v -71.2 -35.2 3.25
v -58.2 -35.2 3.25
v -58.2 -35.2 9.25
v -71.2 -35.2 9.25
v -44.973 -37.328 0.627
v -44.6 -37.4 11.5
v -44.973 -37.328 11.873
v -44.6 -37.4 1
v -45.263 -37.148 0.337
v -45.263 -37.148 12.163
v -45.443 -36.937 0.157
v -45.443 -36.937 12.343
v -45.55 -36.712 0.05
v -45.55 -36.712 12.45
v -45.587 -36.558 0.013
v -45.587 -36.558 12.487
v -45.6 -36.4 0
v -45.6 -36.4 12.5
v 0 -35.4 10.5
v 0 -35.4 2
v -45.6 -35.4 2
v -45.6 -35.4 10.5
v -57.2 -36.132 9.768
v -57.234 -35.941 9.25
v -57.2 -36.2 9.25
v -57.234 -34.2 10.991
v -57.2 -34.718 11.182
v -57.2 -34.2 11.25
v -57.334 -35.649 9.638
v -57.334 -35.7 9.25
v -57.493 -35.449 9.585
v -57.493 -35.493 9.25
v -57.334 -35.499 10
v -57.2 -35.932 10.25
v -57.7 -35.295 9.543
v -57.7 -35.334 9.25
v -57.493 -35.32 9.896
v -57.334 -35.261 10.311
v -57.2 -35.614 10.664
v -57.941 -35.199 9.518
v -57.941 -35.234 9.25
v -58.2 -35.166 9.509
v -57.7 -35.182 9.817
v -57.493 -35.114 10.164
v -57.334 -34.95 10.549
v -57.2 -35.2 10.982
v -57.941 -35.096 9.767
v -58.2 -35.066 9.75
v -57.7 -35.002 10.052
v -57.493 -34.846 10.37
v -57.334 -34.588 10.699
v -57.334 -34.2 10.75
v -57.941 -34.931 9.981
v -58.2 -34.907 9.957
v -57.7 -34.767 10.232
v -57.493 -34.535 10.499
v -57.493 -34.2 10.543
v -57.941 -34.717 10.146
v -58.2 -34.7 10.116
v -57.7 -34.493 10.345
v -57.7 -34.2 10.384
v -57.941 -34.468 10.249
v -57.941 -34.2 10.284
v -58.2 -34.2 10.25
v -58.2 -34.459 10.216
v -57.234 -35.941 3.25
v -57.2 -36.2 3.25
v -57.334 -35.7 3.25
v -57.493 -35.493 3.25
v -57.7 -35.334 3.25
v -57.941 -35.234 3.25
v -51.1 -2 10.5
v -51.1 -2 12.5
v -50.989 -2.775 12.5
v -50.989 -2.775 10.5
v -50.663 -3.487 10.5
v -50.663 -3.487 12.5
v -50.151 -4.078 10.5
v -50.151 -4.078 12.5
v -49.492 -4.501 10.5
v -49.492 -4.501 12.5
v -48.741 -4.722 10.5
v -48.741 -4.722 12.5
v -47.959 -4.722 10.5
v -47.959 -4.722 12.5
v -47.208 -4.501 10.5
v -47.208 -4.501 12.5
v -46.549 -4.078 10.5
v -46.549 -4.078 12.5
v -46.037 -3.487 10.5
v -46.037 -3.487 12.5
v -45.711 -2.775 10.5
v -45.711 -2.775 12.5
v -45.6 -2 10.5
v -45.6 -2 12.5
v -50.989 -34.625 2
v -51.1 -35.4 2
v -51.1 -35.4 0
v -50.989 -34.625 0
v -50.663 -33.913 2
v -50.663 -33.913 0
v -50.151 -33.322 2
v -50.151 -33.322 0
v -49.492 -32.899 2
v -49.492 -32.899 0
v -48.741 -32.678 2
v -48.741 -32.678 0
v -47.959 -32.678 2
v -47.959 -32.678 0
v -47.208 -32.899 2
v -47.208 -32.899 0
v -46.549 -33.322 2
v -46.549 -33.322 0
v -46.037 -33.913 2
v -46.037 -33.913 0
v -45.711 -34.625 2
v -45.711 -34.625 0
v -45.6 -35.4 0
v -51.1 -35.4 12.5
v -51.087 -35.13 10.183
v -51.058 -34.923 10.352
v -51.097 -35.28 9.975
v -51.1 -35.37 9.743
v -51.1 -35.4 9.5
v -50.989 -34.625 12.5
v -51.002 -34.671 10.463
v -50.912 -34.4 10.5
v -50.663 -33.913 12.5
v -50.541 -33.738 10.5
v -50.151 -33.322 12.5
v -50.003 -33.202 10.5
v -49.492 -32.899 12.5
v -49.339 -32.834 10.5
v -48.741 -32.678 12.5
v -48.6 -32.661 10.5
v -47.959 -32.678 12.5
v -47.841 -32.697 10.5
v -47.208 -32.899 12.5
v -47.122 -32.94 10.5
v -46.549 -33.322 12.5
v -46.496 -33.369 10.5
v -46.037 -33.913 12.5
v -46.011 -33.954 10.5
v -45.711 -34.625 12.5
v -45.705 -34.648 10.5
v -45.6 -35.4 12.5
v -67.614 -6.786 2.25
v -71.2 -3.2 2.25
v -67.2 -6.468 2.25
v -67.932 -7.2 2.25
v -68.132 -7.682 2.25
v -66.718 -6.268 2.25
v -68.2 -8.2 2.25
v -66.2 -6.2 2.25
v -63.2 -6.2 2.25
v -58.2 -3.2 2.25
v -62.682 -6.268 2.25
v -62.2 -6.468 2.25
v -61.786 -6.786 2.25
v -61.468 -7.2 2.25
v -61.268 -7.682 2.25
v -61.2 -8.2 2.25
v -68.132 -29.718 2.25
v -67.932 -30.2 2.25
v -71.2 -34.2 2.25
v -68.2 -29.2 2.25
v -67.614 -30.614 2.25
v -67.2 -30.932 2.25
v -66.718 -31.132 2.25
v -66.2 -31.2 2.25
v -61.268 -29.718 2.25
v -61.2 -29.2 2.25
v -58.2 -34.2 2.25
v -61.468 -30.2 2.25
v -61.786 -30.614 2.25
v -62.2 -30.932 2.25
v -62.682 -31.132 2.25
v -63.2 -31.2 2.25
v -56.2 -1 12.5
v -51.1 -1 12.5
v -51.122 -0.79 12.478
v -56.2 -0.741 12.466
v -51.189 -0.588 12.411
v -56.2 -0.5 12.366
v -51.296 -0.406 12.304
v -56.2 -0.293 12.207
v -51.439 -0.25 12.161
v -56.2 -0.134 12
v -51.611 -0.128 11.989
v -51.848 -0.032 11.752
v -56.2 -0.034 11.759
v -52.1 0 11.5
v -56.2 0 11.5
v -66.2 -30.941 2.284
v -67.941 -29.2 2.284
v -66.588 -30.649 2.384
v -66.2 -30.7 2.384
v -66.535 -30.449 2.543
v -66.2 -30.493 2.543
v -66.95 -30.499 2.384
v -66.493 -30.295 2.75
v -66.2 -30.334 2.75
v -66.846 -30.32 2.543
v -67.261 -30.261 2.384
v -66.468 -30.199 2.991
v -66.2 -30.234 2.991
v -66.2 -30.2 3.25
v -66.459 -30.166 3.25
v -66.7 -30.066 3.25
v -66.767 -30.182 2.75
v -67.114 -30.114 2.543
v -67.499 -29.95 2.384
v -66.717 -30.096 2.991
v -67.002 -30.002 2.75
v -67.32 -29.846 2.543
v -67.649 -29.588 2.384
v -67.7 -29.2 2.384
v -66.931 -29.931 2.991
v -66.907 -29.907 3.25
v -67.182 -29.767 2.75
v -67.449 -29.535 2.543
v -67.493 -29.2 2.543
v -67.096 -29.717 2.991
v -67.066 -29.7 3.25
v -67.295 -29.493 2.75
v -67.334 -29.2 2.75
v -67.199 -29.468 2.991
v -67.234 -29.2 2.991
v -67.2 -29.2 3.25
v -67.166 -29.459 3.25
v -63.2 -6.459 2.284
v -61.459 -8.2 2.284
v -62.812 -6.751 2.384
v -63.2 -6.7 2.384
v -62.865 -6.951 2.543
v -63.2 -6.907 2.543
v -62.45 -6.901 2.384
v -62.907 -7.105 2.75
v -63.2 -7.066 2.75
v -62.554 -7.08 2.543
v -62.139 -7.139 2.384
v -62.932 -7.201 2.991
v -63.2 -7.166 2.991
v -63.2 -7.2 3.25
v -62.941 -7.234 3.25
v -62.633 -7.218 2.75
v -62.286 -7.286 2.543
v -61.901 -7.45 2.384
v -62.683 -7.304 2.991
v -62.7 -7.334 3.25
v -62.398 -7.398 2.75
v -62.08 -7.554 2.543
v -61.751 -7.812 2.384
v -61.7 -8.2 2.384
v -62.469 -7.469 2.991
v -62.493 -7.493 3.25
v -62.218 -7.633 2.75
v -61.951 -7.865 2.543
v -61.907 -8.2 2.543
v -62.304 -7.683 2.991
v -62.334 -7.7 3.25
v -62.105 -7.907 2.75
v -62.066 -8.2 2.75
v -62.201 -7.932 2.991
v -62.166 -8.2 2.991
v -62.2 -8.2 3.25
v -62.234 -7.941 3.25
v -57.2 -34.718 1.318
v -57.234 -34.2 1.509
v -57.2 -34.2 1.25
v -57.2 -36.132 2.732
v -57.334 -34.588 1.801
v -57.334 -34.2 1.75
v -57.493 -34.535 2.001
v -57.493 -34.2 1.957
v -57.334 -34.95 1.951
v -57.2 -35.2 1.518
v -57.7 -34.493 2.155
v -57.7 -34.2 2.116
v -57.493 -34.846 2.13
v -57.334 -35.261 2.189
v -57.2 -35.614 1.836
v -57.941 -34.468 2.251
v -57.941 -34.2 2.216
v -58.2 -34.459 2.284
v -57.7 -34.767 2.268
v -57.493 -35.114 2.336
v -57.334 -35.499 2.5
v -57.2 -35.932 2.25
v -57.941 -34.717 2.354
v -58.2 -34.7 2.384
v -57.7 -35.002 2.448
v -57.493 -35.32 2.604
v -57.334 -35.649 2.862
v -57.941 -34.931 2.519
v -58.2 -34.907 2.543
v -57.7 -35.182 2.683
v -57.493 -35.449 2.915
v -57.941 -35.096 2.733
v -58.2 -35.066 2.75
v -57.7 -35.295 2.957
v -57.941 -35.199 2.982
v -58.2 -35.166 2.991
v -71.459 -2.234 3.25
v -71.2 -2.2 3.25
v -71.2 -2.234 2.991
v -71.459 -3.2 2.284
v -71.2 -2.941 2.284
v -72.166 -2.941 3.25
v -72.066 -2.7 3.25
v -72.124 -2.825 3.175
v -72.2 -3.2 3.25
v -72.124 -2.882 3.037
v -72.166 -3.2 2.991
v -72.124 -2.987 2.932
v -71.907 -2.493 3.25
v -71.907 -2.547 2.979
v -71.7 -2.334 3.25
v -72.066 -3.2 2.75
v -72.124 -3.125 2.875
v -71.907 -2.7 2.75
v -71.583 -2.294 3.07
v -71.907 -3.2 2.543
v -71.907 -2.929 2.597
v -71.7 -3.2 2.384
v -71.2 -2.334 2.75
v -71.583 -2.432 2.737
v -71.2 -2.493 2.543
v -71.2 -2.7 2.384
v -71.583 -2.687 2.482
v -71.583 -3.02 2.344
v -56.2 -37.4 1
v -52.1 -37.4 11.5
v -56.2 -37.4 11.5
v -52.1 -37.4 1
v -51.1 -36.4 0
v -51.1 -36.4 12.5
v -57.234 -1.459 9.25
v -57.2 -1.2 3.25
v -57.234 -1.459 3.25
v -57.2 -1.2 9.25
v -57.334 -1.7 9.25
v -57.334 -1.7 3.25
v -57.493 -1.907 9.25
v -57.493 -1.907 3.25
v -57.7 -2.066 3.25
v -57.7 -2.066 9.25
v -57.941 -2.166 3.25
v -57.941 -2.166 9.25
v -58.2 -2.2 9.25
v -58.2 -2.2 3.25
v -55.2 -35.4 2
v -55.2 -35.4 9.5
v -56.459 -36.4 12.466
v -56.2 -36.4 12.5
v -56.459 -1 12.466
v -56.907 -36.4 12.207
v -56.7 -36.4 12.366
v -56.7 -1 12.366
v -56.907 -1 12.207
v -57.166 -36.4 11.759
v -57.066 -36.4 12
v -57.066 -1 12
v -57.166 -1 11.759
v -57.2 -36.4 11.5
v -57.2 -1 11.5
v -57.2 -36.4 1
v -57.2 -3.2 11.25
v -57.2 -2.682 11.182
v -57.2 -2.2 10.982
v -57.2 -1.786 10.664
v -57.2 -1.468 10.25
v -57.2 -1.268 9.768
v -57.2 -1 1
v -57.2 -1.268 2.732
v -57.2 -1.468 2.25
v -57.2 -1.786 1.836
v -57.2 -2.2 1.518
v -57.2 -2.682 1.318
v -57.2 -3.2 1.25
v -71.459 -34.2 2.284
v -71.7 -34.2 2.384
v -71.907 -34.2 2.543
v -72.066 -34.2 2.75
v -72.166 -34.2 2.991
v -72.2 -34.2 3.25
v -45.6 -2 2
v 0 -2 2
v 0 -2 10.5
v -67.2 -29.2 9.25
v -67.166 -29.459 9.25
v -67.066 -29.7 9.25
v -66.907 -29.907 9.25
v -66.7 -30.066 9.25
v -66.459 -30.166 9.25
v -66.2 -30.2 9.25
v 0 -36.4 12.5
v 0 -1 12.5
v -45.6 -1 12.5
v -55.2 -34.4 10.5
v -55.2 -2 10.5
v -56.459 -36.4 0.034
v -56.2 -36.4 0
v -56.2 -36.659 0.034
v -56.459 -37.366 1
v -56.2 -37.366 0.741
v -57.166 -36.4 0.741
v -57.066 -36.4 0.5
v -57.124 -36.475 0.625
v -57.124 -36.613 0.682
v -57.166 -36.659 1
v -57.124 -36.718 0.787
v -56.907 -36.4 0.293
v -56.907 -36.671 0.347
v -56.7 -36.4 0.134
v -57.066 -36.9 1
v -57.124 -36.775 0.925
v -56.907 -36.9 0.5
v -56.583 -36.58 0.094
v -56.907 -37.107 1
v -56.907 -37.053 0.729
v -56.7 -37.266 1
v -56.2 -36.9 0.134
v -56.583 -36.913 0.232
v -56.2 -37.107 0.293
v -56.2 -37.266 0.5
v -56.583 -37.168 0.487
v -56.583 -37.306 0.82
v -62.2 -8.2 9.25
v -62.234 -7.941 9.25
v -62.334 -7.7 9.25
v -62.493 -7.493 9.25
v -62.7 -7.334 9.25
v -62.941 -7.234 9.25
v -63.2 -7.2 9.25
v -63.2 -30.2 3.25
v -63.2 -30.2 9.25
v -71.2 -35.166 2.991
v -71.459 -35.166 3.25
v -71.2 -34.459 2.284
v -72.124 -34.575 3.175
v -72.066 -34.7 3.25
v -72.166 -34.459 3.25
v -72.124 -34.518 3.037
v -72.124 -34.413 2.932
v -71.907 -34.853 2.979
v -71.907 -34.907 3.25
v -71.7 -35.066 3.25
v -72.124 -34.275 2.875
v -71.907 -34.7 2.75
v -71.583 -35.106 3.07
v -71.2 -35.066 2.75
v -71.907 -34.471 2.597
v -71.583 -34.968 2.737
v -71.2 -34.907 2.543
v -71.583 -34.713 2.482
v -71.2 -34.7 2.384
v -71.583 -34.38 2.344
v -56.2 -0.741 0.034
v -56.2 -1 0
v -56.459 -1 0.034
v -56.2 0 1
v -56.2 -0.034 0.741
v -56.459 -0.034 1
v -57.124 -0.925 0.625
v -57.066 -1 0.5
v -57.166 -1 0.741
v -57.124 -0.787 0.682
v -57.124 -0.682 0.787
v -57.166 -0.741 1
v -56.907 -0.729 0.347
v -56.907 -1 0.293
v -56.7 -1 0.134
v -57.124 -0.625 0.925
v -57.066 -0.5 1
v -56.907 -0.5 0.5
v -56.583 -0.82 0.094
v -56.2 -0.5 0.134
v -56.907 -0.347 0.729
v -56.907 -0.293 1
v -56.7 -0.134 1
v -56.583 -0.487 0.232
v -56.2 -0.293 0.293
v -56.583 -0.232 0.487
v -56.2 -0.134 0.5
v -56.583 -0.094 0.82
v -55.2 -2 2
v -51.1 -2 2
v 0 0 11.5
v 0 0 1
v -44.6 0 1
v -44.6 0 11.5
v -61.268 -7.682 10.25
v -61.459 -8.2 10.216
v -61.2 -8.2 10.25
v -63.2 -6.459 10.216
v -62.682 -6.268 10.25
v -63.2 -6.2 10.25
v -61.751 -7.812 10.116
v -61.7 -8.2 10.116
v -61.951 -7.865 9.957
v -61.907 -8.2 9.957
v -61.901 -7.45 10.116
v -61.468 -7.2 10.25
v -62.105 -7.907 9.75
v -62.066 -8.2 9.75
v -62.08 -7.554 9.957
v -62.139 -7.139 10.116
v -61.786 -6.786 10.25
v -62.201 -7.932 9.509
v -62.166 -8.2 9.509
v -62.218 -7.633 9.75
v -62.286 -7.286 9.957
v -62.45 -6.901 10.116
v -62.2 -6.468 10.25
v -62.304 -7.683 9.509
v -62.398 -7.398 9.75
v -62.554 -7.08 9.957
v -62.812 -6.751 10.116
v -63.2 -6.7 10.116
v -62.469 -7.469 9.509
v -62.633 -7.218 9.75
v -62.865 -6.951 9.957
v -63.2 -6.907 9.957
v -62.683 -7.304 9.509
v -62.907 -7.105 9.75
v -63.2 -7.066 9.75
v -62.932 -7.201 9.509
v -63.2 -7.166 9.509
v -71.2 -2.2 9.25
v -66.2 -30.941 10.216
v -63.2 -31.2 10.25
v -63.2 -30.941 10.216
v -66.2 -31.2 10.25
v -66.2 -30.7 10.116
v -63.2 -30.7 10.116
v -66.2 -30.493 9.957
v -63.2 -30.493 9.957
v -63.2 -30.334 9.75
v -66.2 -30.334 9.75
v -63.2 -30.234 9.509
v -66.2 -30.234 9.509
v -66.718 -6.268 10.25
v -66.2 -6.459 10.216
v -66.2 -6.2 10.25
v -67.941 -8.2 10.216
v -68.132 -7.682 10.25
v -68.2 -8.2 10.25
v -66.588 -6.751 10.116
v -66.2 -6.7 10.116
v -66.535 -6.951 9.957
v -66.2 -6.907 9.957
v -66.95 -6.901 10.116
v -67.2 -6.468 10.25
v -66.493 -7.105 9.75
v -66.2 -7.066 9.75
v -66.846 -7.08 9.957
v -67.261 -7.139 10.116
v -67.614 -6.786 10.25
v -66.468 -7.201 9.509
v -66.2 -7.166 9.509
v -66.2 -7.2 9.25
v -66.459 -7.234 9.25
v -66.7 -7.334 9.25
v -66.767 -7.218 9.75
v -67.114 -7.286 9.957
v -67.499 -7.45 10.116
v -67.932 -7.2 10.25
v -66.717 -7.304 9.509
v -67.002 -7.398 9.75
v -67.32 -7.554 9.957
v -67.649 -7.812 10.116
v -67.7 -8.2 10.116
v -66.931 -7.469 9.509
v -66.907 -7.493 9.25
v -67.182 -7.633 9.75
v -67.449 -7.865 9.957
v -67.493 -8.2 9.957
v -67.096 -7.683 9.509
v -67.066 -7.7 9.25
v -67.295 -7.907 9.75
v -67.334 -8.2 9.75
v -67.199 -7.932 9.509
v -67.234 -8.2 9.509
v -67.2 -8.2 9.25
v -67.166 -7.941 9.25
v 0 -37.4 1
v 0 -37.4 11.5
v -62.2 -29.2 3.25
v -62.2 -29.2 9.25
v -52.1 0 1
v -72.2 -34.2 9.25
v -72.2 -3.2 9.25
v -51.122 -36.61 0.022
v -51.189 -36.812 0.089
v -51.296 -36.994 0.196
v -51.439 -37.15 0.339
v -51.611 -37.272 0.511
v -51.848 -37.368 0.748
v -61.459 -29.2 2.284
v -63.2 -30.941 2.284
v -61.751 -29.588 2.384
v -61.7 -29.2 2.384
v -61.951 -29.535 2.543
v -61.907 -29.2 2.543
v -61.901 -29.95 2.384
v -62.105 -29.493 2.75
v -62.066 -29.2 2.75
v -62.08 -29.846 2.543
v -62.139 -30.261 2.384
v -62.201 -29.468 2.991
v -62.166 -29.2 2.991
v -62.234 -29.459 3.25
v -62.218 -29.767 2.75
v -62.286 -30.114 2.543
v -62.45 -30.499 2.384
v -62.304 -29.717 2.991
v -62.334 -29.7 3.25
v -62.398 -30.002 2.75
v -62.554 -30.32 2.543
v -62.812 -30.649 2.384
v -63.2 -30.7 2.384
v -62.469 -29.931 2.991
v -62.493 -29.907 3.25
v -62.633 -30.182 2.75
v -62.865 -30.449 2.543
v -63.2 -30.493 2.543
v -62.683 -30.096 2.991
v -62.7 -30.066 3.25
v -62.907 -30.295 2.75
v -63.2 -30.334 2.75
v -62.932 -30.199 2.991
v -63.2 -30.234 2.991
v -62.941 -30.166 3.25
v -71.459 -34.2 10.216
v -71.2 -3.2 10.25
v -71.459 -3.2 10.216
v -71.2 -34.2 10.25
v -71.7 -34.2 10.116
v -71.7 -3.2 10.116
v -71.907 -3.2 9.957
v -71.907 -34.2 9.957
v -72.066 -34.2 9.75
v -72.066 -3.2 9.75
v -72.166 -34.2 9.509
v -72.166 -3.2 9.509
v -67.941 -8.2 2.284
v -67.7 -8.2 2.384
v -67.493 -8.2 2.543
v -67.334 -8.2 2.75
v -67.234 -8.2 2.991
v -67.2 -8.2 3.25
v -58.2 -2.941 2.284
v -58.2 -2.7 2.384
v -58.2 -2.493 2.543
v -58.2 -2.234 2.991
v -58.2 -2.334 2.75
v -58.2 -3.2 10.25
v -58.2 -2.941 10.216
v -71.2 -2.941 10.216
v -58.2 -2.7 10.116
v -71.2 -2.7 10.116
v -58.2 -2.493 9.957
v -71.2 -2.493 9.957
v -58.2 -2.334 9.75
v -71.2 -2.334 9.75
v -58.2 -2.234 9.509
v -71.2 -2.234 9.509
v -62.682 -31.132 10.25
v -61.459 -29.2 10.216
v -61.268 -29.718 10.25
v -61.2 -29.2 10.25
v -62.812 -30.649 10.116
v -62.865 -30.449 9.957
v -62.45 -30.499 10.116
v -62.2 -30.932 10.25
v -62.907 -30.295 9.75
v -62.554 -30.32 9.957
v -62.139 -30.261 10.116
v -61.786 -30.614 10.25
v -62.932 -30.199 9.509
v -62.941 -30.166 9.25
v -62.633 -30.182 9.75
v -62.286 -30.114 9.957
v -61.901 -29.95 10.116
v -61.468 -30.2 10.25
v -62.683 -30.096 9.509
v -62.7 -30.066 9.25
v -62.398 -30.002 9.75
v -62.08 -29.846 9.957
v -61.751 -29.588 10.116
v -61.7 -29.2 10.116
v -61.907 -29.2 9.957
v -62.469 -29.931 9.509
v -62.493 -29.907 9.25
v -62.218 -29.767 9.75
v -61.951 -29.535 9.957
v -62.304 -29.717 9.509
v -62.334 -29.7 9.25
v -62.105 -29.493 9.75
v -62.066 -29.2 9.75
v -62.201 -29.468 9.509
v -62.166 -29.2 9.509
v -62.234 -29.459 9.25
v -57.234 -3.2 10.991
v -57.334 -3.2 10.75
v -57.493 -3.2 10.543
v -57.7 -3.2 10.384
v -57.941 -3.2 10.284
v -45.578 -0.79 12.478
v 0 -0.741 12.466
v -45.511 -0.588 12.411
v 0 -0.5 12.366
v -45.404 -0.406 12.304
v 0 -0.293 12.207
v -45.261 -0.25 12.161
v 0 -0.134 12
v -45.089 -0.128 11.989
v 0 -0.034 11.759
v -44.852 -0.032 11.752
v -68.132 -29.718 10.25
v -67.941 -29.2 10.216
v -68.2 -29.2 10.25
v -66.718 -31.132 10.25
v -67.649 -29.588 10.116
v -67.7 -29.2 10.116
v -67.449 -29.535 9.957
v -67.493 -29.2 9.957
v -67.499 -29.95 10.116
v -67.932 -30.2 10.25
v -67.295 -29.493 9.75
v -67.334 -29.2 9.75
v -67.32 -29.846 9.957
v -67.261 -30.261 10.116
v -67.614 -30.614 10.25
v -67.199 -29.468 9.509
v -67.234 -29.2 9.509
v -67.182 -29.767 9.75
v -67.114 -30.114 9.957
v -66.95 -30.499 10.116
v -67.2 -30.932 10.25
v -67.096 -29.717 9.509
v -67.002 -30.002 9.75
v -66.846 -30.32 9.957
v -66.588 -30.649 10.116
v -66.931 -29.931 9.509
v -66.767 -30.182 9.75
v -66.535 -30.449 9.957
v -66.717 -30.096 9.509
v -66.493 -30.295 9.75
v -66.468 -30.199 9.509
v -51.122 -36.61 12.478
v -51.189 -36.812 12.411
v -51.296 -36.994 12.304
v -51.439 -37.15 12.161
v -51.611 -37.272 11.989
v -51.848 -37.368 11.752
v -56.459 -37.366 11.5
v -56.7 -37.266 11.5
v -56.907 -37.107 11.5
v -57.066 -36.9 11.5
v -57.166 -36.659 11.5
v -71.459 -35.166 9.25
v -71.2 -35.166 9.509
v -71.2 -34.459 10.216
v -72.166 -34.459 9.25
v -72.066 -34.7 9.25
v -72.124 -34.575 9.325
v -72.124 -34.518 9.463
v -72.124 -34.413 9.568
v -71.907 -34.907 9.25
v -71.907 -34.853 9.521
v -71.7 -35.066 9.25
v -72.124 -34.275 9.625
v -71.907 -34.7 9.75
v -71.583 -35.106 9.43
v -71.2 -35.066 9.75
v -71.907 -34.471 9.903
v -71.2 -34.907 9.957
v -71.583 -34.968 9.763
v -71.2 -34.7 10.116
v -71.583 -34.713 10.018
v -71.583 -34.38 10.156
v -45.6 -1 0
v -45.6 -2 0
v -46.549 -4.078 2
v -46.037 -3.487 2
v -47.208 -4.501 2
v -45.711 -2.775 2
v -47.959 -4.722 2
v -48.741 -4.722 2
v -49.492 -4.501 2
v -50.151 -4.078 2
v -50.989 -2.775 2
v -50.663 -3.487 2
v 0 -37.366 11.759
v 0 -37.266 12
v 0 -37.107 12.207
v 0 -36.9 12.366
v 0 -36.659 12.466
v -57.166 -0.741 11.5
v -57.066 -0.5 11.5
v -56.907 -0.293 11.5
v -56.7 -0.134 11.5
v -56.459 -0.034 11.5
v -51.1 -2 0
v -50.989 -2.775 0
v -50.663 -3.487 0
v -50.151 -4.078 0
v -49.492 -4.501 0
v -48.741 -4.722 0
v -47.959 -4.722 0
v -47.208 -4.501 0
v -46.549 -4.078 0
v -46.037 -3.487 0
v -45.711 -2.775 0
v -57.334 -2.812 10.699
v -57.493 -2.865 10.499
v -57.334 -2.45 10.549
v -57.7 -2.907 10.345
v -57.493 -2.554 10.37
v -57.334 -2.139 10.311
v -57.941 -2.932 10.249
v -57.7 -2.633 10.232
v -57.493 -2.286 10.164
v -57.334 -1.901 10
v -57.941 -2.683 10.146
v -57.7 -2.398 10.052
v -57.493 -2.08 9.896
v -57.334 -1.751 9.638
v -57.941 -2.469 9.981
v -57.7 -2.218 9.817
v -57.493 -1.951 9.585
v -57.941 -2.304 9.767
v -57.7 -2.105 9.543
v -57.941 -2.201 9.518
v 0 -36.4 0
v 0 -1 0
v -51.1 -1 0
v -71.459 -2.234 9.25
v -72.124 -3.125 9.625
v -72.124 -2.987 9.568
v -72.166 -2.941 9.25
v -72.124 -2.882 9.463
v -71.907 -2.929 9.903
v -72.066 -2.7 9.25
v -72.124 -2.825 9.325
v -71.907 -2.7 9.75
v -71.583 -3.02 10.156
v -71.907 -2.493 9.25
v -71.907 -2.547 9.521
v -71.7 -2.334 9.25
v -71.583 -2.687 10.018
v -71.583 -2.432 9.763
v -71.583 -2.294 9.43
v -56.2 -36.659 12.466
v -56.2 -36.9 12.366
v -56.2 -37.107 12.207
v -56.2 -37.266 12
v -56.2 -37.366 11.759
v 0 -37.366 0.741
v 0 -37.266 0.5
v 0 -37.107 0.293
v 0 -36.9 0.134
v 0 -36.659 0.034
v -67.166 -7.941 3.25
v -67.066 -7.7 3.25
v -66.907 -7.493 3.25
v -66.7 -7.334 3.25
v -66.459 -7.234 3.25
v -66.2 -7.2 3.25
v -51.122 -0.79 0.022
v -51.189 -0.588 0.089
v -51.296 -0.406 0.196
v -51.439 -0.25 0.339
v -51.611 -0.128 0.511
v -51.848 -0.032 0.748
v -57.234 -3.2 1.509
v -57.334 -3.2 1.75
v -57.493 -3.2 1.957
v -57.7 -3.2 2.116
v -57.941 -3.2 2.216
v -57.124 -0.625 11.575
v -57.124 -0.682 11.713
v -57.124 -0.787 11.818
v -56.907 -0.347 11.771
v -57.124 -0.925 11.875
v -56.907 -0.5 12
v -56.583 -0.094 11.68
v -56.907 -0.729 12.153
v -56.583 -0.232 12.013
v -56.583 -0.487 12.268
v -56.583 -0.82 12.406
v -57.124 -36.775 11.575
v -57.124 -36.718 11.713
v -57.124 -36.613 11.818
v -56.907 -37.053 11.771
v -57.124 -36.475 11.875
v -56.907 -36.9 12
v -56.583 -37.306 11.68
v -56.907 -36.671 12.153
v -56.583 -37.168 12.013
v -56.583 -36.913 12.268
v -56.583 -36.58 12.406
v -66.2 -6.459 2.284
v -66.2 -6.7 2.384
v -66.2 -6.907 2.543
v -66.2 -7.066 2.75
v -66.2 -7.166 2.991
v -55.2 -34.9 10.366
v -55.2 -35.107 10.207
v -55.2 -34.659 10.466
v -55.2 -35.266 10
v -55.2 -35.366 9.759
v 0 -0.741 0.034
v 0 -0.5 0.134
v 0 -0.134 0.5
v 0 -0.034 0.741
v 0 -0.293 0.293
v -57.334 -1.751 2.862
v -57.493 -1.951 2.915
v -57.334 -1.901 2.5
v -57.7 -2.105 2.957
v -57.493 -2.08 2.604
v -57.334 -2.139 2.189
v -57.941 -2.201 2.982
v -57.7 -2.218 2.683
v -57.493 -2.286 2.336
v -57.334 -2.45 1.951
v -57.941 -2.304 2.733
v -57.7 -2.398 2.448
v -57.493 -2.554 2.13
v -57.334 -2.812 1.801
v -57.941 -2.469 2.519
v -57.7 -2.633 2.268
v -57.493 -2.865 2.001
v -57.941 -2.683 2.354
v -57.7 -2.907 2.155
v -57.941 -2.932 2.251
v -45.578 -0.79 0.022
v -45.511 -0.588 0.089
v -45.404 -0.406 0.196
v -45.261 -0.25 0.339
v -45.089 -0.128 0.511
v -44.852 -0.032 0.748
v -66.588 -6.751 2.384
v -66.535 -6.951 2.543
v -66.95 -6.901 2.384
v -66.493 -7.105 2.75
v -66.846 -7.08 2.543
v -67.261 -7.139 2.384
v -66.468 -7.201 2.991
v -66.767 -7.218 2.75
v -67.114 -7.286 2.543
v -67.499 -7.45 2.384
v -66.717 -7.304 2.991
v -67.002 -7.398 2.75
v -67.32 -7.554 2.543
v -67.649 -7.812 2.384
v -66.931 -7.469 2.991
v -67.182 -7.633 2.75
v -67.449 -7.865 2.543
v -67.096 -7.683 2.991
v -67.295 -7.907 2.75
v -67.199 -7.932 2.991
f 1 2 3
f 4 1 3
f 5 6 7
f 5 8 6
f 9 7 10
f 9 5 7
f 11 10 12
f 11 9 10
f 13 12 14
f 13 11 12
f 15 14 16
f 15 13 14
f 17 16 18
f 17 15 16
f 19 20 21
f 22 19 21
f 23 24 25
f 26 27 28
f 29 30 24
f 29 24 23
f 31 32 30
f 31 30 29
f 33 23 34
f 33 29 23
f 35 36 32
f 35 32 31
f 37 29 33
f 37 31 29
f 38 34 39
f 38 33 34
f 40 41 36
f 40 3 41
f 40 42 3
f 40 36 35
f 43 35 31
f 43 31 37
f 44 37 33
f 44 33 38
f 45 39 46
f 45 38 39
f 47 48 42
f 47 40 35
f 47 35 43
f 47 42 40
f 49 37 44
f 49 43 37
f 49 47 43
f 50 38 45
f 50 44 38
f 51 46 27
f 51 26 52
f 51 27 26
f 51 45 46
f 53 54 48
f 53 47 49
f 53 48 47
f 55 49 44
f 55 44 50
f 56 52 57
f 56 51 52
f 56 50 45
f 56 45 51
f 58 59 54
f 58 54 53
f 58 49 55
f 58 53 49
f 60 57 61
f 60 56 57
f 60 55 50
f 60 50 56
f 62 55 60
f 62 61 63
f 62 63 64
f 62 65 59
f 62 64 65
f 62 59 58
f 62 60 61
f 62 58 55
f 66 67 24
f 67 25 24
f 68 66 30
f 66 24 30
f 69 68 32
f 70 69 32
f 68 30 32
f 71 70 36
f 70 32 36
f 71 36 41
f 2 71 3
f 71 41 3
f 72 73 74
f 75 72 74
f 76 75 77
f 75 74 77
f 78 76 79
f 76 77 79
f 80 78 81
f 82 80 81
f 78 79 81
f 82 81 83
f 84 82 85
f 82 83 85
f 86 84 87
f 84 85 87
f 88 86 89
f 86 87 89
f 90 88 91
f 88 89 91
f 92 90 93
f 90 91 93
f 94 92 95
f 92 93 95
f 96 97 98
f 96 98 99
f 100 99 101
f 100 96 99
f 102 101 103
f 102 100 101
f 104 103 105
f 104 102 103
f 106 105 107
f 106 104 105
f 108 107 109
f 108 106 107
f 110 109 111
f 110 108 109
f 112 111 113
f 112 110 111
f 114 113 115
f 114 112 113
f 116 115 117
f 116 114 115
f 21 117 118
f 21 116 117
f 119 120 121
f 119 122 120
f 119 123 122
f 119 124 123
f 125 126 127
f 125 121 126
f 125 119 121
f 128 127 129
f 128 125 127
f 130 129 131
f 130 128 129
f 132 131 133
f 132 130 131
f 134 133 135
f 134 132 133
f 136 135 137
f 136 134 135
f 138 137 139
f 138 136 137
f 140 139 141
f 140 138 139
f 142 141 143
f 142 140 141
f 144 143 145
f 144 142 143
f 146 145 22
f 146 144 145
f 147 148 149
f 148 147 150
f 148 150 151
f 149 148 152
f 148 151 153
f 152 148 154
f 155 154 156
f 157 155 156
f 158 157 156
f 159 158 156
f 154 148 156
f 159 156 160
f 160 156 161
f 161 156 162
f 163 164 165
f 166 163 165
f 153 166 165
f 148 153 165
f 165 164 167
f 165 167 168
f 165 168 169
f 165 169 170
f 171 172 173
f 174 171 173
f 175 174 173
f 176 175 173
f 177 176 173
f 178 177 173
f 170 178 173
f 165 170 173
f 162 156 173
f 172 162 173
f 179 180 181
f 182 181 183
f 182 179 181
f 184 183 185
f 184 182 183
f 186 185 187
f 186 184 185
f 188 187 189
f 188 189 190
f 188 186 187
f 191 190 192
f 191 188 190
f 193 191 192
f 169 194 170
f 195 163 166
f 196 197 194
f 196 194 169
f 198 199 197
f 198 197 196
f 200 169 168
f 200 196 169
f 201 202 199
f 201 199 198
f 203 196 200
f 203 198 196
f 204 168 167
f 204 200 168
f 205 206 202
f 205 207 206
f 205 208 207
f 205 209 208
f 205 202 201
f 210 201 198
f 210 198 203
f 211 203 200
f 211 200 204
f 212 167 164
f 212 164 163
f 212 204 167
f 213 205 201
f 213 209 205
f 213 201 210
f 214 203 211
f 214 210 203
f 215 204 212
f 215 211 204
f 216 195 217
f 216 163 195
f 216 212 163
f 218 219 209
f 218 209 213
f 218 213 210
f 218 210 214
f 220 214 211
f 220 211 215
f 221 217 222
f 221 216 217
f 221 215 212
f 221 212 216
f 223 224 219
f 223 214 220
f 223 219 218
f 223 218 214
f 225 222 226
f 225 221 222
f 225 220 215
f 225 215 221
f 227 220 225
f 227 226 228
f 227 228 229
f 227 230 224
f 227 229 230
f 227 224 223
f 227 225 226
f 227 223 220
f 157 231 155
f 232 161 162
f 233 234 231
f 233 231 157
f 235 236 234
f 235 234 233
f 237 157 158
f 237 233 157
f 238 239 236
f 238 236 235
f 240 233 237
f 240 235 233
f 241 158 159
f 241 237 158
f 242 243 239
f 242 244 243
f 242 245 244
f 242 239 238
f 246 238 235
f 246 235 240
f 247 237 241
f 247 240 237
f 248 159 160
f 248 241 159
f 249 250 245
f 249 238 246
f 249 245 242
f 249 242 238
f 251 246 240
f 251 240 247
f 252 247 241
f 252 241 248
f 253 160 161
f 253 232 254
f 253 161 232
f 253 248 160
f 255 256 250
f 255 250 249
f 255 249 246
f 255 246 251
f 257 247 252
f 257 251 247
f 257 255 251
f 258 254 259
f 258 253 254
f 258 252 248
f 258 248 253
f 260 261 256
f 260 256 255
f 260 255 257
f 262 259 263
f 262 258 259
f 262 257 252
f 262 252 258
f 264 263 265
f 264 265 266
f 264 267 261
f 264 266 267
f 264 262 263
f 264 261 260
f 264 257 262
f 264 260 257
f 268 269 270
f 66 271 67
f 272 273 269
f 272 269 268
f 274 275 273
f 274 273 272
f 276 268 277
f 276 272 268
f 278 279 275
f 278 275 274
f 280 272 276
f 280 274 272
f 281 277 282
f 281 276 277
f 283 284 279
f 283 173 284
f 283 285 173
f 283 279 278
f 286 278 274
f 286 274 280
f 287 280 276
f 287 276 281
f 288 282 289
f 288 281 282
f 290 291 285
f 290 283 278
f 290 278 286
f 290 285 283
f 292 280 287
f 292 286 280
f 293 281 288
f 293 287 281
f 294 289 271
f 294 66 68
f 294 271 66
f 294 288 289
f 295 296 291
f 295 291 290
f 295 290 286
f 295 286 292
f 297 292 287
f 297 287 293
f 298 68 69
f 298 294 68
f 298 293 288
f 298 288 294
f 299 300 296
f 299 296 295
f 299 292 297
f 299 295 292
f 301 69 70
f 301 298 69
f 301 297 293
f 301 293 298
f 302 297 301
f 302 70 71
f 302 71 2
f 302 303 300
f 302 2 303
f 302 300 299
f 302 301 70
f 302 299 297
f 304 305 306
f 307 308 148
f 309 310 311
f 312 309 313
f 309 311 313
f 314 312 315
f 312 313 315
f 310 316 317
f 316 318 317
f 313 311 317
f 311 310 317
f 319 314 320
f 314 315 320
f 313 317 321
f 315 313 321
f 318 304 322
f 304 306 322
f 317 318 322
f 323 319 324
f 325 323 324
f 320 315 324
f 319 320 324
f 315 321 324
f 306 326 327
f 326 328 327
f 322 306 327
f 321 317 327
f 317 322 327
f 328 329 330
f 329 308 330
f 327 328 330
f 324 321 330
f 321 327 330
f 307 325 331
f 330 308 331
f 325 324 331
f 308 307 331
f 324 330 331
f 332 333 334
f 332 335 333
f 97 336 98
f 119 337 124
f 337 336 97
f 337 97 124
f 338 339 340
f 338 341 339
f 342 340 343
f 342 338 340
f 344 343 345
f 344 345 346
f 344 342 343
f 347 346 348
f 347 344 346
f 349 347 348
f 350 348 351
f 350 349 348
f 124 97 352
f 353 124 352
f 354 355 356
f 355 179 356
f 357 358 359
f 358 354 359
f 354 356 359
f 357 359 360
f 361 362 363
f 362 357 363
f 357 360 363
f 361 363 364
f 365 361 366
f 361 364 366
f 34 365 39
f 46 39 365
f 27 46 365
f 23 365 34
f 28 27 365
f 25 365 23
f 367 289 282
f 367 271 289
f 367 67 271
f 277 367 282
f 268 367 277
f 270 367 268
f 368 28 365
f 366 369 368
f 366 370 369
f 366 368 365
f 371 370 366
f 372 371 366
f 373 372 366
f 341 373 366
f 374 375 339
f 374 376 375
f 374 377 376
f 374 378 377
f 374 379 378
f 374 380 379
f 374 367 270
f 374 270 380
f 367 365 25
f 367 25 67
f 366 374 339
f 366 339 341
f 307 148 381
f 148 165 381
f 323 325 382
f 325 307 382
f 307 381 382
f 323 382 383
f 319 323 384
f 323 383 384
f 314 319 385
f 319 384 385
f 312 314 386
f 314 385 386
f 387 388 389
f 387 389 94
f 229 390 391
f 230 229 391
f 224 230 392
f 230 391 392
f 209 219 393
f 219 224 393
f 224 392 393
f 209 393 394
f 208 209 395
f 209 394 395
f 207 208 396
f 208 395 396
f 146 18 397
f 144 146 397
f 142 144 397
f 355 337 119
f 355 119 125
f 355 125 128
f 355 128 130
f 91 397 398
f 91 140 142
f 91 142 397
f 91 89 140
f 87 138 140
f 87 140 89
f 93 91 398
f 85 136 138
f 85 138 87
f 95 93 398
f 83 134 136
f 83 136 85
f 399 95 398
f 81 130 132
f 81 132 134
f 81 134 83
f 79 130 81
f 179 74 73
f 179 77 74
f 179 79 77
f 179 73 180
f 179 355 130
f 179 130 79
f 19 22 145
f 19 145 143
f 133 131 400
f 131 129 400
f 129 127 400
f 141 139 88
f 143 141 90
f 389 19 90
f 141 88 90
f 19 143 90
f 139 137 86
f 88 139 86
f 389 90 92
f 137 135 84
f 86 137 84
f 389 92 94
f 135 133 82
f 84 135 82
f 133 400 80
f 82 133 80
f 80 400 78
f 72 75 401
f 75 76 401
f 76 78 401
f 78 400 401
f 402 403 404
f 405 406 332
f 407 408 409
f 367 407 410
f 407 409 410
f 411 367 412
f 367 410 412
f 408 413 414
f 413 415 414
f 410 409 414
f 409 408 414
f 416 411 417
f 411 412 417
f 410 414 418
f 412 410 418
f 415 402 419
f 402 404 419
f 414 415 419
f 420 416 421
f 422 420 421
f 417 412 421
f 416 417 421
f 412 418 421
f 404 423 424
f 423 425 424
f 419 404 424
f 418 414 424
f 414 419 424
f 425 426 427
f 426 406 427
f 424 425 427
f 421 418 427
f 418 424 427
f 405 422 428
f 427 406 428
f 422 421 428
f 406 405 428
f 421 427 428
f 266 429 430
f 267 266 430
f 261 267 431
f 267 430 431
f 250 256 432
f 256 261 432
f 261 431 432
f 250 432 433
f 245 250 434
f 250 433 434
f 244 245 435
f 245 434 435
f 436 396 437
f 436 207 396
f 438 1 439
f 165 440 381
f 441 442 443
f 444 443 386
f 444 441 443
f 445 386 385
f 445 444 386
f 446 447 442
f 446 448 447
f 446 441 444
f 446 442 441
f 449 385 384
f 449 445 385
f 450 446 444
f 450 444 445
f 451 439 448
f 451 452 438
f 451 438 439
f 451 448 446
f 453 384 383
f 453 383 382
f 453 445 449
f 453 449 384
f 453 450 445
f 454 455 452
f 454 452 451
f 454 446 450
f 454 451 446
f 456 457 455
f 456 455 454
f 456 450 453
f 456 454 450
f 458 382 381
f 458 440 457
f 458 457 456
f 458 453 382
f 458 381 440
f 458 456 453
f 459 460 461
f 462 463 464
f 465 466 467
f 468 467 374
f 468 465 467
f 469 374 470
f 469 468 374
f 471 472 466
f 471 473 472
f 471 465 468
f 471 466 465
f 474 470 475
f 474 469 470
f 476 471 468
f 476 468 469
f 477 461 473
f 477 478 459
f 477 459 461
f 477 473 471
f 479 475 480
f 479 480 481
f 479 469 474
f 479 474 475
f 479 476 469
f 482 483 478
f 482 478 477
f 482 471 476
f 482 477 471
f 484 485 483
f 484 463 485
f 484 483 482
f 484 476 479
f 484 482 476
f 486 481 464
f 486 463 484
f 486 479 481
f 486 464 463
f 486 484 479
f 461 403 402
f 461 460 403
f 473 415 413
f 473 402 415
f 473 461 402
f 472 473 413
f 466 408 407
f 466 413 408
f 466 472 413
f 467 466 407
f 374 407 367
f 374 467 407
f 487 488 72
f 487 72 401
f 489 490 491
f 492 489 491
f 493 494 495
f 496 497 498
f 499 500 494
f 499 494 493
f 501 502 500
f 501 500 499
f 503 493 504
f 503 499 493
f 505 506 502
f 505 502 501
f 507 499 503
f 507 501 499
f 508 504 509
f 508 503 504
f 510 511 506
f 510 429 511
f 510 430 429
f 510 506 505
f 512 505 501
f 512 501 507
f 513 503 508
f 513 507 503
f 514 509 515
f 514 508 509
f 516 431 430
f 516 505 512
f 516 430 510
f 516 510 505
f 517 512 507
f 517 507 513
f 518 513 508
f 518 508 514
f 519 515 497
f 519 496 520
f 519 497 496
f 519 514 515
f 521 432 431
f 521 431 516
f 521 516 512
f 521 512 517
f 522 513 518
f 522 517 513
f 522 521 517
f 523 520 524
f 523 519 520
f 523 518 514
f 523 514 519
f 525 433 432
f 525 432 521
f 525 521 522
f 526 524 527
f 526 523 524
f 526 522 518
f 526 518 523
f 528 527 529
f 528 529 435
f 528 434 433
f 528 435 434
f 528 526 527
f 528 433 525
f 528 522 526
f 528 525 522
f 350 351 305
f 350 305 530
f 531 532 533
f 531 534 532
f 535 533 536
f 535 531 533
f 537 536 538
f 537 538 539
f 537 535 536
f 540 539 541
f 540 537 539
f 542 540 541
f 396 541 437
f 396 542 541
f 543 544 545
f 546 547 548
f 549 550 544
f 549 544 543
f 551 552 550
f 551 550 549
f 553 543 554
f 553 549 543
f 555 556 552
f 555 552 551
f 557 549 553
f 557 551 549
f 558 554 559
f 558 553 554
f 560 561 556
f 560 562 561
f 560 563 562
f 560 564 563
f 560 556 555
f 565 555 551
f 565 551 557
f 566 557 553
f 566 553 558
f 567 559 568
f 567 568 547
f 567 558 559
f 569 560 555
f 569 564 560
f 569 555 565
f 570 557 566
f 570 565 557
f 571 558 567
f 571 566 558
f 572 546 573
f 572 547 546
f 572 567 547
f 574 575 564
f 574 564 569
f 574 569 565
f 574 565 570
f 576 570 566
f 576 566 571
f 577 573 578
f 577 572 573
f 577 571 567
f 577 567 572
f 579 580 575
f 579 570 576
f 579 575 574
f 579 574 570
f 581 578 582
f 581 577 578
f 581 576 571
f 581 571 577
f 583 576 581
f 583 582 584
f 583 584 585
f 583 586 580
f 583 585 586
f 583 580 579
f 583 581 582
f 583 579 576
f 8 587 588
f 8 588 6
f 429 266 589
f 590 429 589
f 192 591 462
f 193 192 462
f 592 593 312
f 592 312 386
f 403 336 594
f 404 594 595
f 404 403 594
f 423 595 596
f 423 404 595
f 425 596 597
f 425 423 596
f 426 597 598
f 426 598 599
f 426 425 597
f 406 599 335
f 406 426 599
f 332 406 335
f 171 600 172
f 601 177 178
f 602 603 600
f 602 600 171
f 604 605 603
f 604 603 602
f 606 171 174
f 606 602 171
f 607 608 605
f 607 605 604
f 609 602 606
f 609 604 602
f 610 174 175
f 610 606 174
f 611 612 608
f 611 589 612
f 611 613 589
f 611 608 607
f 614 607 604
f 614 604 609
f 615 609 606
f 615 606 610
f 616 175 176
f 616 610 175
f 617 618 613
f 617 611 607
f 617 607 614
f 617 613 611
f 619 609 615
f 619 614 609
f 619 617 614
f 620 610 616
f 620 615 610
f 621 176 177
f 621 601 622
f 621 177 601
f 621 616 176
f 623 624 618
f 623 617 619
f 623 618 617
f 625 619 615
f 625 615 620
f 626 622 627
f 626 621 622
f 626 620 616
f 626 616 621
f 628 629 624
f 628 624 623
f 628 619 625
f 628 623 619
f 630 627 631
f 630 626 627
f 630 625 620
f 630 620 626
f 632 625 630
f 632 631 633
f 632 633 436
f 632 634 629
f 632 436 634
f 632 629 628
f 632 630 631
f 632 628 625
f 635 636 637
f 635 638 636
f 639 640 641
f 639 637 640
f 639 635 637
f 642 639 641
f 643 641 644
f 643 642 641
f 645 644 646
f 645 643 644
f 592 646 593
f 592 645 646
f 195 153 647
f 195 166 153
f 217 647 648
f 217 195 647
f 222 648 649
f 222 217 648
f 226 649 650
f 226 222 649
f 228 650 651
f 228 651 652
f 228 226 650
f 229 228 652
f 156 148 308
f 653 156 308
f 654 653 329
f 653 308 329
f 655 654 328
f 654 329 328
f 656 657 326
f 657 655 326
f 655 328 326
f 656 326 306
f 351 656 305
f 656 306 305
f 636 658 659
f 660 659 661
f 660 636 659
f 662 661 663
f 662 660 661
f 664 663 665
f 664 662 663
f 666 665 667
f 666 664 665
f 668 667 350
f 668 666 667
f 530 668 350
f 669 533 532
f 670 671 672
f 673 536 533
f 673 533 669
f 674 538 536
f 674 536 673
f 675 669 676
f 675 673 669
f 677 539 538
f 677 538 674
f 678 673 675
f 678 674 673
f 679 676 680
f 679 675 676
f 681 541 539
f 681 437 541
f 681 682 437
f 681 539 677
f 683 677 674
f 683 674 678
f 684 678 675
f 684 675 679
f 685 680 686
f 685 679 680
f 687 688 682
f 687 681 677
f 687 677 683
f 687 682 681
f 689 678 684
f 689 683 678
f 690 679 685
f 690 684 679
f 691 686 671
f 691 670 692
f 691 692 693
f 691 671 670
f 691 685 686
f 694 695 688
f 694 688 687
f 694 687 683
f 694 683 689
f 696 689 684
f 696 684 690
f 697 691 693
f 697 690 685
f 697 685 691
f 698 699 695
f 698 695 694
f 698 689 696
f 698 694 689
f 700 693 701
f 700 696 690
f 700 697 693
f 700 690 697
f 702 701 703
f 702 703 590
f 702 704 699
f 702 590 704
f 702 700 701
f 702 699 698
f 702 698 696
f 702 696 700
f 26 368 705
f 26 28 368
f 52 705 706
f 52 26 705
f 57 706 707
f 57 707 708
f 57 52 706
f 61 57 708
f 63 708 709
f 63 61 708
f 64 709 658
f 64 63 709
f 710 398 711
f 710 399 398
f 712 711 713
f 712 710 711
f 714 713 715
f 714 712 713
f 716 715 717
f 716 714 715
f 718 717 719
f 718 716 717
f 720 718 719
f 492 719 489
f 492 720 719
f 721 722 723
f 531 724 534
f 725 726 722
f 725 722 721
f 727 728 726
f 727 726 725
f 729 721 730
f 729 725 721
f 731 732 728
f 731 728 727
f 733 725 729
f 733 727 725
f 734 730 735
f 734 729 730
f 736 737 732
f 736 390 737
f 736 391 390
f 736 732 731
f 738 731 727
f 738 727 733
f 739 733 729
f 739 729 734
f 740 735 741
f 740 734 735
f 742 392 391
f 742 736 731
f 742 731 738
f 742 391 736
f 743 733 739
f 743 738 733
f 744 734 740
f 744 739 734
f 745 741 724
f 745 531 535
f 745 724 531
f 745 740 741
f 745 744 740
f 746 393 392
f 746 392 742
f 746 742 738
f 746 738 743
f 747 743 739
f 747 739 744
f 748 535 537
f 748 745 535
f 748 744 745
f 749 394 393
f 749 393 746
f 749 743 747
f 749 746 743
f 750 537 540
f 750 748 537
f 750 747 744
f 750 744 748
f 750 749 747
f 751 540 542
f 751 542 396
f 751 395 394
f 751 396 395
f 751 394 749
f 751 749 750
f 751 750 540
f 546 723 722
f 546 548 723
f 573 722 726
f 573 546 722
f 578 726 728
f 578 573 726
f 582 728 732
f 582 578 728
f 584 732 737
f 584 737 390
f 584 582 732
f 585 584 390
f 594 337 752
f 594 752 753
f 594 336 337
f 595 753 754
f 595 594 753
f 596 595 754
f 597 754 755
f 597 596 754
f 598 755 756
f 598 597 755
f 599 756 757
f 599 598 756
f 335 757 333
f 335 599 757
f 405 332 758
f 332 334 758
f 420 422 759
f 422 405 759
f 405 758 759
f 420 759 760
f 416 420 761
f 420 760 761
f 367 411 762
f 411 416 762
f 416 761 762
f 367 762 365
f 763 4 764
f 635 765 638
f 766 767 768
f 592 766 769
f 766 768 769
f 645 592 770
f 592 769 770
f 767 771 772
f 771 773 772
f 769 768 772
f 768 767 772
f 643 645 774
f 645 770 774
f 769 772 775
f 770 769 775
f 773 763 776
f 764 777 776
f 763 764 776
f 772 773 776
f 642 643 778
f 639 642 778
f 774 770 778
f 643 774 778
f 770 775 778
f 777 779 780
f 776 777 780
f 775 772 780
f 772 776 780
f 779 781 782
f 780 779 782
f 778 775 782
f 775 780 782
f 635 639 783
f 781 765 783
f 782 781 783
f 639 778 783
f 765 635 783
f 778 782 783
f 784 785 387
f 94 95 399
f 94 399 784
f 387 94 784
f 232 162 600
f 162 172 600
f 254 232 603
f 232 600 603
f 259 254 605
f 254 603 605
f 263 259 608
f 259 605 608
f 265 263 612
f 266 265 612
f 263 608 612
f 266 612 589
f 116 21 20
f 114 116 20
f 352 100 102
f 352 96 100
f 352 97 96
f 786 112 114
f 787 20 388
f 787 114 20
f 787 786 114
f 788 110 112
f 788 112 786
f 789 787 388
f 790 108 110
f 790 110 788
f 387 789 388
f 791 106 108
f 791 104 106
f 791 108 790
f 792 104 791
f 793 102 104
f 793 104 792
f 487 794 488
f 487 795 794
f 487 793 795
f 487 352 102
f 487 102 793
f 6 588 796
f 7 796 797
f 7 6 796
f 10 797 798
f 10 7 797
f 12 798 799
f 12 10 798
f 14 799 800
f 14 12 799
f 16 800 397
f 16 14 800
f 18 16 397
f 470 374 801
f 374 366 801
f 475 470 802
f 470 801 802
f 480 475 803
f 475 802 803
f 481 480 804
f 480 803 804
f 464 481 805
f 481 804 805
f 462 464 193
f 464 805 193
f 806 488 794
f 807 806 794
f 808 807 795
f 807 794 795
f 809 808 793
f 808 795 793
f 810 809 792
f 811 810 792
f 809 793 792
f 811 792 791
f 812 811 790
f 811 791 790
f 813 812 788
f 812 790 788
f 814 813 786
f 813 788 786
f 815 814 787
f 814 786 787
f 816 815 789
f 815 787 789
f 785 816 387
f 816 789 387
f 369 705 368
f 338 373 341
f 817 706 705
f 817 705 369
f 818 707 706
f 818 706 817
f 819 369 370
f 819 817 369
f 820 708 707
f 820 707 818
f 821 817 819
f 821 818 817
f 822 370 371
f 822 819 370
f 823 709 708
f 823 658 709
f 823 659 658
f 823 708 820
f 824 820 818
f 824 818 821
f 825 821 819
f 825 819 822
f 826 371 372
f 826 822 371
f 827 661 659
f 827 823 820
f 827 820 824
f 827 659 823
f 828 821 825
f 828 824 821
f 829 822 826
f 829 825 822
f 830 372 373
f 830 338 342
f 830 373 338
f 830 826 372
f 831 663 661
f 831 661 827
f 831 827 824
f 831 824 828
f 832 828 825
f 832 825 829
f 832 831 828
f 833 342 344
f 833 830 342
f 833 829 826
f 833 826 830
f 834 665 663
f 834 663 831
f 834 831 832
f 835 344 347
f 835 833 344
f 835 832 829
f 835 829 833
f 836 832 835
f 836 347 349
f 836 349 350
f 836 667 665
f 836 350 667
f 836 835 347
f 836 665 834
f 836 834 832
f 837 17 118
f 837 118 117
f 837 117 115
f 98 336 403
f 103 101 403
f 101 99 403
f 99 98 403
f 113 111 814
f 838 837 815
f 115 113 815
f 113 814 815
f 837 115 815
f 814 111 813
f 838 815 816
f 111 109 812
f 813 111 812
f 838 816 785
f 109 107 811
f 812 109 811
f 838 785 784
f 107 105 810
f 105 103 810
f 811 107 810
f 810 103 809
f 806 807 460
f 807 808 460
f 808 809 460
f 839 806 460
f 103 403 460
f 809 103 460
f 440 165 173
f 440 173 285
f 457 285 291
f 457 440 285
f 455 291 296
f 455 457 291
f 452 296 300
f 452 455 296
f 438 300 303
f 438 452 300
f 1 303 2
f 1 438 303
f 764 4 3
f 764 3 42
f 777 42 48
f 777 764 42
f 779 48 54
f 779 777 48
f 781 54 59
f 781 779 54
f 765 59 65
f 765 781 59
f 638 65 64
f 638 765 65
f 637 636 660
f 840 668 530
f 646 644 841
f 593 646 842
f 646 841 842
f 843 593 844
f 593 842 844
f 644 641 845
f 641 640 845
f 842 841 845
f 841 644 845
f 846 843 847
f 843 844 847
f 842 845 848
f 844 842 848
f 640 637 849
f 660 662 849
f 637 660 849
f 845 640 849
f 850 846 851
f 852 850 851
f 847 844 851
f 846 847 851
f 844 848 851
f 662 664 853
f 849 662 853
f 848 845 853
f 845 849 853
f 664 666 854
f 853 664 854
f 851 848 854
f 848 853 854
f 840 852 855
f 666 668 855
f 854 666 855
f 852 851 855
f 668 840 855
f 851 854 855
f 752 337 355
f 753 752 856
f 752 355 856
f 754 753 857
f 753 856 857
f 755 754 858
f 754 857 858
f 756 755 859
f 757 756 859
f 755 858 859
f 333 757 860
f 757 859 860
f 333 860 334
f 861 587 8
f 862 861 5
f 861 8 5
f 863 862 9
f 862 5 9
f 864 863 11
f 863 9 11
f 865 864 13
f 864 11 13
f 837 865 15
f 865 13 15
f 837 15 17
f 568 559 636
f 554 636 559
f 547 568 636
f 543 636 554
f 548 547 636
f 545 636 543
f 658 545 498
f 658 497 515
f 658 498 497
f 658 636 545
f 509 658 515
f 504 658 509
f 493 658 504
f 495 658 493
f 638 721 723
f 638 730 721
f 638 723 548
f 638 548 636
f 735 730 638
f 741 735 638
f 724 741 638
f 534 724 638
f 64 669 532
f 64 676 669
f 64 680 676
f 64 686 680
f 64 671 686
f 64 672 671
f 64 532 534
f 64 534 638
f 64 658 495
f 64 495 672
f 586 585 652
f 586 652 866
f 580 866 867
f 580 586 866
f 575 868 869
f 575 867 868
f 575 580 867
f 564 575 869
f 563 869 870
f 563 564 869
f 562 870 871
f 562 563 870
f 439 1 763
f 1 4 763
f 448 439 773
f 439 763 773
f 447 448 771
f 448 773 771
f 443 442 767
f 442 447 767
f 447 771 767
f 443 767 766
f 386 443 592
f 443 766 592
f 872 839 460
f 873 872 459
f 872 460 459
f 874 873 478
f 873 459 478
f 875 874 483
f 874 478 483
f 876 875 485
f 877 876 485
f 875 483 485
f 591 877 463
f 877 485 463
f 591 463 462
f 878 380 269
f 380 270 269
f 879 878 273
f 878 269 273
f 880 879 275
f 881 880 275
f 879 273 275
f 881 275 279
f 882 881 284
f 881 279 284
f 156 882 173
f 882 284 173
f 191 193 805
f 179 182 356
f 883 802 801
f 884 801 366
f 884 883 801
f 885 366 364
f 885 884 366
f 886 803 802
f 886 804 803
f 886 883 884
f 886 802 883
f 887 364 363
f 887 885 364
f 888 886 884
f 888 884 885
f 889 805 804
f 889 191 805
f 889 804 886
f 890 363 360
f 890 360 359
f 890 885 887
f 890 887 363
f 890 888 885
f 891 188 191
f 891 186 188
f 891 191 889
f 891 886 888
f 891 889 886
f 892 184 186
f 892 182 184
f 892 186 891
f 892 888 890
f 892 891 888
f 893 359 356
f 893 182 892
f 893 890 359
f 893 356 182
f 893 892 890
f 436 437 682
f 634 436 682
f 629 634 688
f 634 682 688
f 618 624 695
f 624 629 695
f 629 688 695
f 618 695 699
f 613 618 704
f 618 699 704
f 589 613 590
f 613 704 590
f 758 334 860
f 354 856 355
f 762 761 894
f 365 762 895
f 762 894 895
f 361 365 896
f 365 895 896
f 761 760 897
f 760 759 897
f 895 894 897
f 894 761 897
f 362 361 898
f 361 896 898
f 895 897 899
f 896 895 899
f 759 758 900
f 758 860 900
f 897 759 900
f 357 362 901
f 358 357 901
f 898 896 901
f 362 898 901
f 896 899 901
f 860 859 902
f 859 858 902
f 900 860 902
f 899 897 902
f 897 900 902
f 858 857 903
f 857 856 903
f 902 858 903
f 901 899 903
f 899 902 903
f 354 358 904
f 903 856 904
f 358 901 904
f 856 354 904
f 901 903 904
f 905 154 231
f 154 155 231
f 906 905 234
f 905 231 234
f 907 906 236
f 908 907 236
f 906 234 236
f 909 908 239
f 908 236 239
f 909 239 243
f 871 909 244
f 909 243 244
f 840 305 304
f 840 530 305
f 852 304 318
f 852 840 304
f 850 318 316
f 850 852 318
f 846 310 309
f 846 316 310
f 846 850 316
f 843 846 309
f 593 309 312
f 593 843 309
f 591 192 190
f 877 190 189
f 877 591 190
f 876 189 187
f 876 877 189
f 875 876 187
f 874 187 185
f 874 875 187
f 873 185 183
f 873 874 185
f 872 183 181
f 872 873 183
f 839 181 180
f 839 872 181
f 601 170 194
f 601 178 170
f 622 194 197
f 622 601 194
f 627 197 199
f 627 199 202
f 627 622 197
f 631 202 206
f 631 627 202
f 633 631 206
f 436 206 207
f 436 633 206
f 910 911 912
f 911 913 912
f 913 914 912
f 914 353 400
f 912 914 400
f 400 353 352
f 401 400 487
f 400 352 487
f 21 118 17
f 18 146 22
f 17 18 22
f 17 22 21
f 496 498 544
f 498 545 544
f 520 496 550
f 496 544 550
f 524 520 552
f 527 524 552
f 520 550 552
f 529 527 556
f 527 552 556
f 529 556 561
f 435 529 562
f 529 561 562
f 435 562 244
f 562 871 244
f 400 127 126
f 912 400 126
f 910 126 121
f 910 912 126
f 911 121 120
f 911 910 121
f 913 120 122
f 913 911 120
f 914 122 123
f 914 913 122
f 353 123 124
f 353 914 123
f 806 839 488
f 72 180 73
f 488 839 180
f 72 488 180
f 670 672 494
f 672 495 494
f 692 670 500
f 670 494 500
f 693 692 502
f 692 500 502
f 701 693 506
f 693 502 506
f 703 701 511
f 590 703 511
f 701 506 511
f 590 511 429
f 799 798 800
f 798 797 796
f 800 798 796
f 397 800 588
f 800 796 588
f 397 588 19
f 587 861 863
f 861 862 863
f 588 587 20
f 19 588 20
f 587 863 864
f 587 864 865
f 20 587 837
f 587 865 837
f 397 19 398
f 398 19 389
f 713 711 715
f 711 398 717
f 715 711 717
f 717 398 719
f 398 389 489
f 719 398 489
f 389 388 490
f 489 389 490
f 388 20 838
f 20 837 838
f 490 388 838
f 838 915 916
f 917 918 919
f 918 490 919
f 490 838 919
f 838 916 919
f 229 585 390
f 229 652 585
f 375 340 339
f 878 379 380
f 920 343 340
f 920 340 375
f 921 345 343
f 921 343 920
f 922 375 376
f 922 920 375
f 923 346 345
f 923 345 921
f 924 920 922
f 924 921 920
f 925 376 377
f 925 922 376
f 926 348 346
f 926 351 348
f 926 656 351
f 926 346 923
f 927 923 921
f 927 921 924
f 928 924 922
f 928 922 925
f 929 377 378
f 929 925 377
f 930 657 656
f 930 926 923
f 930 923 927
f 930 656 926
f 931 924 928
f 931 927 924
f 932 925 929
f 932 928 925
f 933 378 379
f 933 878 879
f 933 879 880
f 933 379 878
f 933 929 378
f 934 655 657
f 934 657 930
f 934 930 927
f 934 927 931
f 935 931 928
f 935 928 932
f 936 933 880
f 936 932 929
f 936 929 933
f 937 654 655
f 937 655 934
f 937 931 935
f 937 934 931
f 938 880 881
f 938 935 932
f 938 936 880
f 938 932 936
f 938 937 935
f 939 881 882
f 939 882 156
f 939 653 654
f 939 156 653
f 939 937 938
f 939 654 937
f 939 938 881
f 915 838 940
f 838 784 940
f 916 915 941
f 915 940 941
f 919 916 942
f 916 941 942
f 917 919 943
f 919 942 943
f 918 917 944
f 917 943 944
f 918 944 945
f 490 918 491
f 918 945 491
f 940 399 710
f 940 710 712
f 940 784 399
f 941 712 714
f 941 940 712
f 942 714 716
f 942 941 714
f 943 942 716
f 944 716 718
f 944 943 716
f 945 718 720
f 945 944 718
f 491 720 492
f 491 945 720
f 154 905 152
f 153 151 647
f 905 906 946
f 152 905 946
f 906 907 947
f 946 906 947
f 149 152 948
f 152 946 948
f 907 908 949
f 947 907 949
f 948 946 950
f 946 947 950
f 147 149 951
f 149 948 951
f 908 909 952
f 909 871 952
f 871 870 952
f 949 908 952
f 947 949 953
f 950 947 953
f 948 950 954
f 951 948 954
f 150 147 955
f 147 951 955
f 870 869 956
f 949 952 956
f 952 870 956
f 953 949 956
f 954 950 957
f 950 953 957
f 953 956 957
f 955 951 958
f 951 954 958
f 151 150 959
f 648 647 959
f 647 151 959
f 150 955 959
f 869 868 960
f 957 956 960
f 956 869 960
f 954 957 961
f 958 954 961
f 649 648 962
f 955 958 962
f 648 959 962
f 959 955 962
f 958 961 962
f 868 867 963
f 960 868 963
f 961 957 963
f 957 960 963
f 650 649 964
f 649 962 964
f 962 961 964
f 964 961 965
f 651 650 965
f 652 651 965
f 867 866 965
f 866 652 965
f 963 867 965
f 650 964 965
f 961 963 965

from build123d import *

# Parameters (mm, degrees)
SKETCH1_W           = 37.4
SKETCH1_H           = 57.2
BOSS_EXTRUDE1_DEPTH = 12.5
SHELL1_T            = -2
CUT_EXTRUDE1_DEPTH  = 70.475535262
SKETCH3_W           = 33
SKETCH3_H           = 8
BOSS_EXTRUDE2_DEPTH = 15
SKETCH4_W           = 5
SKETCH4_H           = 23
CUT_EXTRUDE2_DEPTH  = 82.955246934
FILLET2_R           = 1


with BuildPart() as part:
    # Sketch1 → Boss-Extrude1 (new body)
    with BuildSketch(Plane(origin=(0, 0, 0), x_dir=(0, 1, 0), z_dir=(0, 0, 1))):
        with Locations((-18.7, 28.6)):
            Rectangle(SKETCH1_W, SKETCH1_H)
    extrude(amount=BOSS_EXTRUDE1_DEPTH)

    # Shell1
    shell1_openings = [part.faces().sort_by_distance(p)[0] for p in [
        (0, -18.7, 6.25),
    ]]
    offset(amount=SHELL1_T, openings=shell1_openings, kind=Kind.INTERSECTION)

    # Sketch2 → Cut-Extrude1 (cut, through all)
    with BuildSketch(Plane.XY.offset(12.5)):
        with BuildLine():
            Line((-51.1, -37.4), (-51.1, -35.4))
            ThreePointArc((-51.1, -35.4), (-48.35, -32.65), (-45.6, -35.4))
            Line((-45.6, -35.4), (-45.6, -37.4))
            Line((-45.6, -37.4), (-51.1, -37.4))
        make_face()
        with BuildLine():
            Line((-51.1, 0), (-51.1, -2))
            ThreePointArc((-51.1, -2), (-48.35, -4.75), (-45.6, -2))
            Line((-45.6, -2), (-45.6, 0))
            Line((-45.6, 0), (-51.1, 0))
        make_face()
    extrude(amount=-CUT_EXTRUDE1_DEPTH, mode=Mode.SUBTRACT)

    # Sketch3 → Boss-Extrude2 (add)
    with BuildSketch(Plane(origin=(-57.2, 0, 0), x_dir=(0, -1, 0), z_dir=(-1, 0, 0))):
        with Locations((18.7, 6.25)):
            Rectangle(SKETCH3_W, SKETCH3_H)
    extrude(amount=BOSS_EXTRUDE2_DEPTH)

    # Sketch4 → Cut-Extrude2 (cut, through all)
    with BuildSketch(Plane(origin=(0, 0, 2.25), x_dir=(1, 0, 0), z_dir=(0, 0, -1))):
        with Locations((-64.7, 18.7)):
            Rectangle(SKETCH4_W, SKETCH4_H)
    extrude(amount=-CUT_EXTRUDE2_DEPTH, mode=Mode.SUBTRACT)

    # Fillet2
    fillet2_edges = [part.edges().sort_by_distance(p)[0] for p in [
        (-54.15, -37.4, 12.5),
        (-53.15, -35.4, 10.5),
        (-54.15, 0, 0),
        (-22.8, -37.4, 0),
        (-54.15, 0, 12.5),
        (-22.8, -37.4, 12.5),
        (-45.6, -37.4, 6.25),
        (-51.1, -37.4, 6.25),
        (-22.8, 0, 12.5),
        (-51.1, 0, 6.25),
        (-45.6, 0, 6.25),
        (-54.15, -37.4, 0),
        (-57.2, -18.7, 0),
        (-22.8, 0, 0),
        (-57.2, -35.2, 6.25),
        (-64.7, -35.2, 2.25),
        (-57.2, -18.7, 10.25),
        (-64.7, -35.2, 10.25),
        (-57.2, -2.2, 6.25),
        (-64.7, -2.2, 10.25),
        (-57.2, -18.7, 2.25),
        (-64.7, -2.2, 2.25),
        (-72.2, -35.2, 6.25),
        (-72.2, -18.7, 10.25),
        (-72.2, -2.2, 6.25),
        (-72.2, -18.7, 2.25),
        (-57.2, -37.4, 6.25),
        (-57.2, 0, 6.25),
        (-64.7, -7.2, 10.25),
        (-62.2, -7.2, 6.25),
        (-67.2, -18.7, 10.25),
        (-67.2, -7.2, 6.25),
        (-64.7, -30.2, 10.25),
        (-67.2, -30.2, 6.25),
        (-62.2, -18.7, 10.25),
        (-62.2, -30.2, 6.25),
        (-64.7, -7.2, 2.25),
        (-62.2, -18.7, 2.25),
        (-57.2, -18.7, 12.5),
        (-64.7, -30.2, 2.25),
        (-67.2, -18.7, 2.25),
    ]]
    fillet(fillet2_edges, radius=FILLET2_R)


solid = part.part
